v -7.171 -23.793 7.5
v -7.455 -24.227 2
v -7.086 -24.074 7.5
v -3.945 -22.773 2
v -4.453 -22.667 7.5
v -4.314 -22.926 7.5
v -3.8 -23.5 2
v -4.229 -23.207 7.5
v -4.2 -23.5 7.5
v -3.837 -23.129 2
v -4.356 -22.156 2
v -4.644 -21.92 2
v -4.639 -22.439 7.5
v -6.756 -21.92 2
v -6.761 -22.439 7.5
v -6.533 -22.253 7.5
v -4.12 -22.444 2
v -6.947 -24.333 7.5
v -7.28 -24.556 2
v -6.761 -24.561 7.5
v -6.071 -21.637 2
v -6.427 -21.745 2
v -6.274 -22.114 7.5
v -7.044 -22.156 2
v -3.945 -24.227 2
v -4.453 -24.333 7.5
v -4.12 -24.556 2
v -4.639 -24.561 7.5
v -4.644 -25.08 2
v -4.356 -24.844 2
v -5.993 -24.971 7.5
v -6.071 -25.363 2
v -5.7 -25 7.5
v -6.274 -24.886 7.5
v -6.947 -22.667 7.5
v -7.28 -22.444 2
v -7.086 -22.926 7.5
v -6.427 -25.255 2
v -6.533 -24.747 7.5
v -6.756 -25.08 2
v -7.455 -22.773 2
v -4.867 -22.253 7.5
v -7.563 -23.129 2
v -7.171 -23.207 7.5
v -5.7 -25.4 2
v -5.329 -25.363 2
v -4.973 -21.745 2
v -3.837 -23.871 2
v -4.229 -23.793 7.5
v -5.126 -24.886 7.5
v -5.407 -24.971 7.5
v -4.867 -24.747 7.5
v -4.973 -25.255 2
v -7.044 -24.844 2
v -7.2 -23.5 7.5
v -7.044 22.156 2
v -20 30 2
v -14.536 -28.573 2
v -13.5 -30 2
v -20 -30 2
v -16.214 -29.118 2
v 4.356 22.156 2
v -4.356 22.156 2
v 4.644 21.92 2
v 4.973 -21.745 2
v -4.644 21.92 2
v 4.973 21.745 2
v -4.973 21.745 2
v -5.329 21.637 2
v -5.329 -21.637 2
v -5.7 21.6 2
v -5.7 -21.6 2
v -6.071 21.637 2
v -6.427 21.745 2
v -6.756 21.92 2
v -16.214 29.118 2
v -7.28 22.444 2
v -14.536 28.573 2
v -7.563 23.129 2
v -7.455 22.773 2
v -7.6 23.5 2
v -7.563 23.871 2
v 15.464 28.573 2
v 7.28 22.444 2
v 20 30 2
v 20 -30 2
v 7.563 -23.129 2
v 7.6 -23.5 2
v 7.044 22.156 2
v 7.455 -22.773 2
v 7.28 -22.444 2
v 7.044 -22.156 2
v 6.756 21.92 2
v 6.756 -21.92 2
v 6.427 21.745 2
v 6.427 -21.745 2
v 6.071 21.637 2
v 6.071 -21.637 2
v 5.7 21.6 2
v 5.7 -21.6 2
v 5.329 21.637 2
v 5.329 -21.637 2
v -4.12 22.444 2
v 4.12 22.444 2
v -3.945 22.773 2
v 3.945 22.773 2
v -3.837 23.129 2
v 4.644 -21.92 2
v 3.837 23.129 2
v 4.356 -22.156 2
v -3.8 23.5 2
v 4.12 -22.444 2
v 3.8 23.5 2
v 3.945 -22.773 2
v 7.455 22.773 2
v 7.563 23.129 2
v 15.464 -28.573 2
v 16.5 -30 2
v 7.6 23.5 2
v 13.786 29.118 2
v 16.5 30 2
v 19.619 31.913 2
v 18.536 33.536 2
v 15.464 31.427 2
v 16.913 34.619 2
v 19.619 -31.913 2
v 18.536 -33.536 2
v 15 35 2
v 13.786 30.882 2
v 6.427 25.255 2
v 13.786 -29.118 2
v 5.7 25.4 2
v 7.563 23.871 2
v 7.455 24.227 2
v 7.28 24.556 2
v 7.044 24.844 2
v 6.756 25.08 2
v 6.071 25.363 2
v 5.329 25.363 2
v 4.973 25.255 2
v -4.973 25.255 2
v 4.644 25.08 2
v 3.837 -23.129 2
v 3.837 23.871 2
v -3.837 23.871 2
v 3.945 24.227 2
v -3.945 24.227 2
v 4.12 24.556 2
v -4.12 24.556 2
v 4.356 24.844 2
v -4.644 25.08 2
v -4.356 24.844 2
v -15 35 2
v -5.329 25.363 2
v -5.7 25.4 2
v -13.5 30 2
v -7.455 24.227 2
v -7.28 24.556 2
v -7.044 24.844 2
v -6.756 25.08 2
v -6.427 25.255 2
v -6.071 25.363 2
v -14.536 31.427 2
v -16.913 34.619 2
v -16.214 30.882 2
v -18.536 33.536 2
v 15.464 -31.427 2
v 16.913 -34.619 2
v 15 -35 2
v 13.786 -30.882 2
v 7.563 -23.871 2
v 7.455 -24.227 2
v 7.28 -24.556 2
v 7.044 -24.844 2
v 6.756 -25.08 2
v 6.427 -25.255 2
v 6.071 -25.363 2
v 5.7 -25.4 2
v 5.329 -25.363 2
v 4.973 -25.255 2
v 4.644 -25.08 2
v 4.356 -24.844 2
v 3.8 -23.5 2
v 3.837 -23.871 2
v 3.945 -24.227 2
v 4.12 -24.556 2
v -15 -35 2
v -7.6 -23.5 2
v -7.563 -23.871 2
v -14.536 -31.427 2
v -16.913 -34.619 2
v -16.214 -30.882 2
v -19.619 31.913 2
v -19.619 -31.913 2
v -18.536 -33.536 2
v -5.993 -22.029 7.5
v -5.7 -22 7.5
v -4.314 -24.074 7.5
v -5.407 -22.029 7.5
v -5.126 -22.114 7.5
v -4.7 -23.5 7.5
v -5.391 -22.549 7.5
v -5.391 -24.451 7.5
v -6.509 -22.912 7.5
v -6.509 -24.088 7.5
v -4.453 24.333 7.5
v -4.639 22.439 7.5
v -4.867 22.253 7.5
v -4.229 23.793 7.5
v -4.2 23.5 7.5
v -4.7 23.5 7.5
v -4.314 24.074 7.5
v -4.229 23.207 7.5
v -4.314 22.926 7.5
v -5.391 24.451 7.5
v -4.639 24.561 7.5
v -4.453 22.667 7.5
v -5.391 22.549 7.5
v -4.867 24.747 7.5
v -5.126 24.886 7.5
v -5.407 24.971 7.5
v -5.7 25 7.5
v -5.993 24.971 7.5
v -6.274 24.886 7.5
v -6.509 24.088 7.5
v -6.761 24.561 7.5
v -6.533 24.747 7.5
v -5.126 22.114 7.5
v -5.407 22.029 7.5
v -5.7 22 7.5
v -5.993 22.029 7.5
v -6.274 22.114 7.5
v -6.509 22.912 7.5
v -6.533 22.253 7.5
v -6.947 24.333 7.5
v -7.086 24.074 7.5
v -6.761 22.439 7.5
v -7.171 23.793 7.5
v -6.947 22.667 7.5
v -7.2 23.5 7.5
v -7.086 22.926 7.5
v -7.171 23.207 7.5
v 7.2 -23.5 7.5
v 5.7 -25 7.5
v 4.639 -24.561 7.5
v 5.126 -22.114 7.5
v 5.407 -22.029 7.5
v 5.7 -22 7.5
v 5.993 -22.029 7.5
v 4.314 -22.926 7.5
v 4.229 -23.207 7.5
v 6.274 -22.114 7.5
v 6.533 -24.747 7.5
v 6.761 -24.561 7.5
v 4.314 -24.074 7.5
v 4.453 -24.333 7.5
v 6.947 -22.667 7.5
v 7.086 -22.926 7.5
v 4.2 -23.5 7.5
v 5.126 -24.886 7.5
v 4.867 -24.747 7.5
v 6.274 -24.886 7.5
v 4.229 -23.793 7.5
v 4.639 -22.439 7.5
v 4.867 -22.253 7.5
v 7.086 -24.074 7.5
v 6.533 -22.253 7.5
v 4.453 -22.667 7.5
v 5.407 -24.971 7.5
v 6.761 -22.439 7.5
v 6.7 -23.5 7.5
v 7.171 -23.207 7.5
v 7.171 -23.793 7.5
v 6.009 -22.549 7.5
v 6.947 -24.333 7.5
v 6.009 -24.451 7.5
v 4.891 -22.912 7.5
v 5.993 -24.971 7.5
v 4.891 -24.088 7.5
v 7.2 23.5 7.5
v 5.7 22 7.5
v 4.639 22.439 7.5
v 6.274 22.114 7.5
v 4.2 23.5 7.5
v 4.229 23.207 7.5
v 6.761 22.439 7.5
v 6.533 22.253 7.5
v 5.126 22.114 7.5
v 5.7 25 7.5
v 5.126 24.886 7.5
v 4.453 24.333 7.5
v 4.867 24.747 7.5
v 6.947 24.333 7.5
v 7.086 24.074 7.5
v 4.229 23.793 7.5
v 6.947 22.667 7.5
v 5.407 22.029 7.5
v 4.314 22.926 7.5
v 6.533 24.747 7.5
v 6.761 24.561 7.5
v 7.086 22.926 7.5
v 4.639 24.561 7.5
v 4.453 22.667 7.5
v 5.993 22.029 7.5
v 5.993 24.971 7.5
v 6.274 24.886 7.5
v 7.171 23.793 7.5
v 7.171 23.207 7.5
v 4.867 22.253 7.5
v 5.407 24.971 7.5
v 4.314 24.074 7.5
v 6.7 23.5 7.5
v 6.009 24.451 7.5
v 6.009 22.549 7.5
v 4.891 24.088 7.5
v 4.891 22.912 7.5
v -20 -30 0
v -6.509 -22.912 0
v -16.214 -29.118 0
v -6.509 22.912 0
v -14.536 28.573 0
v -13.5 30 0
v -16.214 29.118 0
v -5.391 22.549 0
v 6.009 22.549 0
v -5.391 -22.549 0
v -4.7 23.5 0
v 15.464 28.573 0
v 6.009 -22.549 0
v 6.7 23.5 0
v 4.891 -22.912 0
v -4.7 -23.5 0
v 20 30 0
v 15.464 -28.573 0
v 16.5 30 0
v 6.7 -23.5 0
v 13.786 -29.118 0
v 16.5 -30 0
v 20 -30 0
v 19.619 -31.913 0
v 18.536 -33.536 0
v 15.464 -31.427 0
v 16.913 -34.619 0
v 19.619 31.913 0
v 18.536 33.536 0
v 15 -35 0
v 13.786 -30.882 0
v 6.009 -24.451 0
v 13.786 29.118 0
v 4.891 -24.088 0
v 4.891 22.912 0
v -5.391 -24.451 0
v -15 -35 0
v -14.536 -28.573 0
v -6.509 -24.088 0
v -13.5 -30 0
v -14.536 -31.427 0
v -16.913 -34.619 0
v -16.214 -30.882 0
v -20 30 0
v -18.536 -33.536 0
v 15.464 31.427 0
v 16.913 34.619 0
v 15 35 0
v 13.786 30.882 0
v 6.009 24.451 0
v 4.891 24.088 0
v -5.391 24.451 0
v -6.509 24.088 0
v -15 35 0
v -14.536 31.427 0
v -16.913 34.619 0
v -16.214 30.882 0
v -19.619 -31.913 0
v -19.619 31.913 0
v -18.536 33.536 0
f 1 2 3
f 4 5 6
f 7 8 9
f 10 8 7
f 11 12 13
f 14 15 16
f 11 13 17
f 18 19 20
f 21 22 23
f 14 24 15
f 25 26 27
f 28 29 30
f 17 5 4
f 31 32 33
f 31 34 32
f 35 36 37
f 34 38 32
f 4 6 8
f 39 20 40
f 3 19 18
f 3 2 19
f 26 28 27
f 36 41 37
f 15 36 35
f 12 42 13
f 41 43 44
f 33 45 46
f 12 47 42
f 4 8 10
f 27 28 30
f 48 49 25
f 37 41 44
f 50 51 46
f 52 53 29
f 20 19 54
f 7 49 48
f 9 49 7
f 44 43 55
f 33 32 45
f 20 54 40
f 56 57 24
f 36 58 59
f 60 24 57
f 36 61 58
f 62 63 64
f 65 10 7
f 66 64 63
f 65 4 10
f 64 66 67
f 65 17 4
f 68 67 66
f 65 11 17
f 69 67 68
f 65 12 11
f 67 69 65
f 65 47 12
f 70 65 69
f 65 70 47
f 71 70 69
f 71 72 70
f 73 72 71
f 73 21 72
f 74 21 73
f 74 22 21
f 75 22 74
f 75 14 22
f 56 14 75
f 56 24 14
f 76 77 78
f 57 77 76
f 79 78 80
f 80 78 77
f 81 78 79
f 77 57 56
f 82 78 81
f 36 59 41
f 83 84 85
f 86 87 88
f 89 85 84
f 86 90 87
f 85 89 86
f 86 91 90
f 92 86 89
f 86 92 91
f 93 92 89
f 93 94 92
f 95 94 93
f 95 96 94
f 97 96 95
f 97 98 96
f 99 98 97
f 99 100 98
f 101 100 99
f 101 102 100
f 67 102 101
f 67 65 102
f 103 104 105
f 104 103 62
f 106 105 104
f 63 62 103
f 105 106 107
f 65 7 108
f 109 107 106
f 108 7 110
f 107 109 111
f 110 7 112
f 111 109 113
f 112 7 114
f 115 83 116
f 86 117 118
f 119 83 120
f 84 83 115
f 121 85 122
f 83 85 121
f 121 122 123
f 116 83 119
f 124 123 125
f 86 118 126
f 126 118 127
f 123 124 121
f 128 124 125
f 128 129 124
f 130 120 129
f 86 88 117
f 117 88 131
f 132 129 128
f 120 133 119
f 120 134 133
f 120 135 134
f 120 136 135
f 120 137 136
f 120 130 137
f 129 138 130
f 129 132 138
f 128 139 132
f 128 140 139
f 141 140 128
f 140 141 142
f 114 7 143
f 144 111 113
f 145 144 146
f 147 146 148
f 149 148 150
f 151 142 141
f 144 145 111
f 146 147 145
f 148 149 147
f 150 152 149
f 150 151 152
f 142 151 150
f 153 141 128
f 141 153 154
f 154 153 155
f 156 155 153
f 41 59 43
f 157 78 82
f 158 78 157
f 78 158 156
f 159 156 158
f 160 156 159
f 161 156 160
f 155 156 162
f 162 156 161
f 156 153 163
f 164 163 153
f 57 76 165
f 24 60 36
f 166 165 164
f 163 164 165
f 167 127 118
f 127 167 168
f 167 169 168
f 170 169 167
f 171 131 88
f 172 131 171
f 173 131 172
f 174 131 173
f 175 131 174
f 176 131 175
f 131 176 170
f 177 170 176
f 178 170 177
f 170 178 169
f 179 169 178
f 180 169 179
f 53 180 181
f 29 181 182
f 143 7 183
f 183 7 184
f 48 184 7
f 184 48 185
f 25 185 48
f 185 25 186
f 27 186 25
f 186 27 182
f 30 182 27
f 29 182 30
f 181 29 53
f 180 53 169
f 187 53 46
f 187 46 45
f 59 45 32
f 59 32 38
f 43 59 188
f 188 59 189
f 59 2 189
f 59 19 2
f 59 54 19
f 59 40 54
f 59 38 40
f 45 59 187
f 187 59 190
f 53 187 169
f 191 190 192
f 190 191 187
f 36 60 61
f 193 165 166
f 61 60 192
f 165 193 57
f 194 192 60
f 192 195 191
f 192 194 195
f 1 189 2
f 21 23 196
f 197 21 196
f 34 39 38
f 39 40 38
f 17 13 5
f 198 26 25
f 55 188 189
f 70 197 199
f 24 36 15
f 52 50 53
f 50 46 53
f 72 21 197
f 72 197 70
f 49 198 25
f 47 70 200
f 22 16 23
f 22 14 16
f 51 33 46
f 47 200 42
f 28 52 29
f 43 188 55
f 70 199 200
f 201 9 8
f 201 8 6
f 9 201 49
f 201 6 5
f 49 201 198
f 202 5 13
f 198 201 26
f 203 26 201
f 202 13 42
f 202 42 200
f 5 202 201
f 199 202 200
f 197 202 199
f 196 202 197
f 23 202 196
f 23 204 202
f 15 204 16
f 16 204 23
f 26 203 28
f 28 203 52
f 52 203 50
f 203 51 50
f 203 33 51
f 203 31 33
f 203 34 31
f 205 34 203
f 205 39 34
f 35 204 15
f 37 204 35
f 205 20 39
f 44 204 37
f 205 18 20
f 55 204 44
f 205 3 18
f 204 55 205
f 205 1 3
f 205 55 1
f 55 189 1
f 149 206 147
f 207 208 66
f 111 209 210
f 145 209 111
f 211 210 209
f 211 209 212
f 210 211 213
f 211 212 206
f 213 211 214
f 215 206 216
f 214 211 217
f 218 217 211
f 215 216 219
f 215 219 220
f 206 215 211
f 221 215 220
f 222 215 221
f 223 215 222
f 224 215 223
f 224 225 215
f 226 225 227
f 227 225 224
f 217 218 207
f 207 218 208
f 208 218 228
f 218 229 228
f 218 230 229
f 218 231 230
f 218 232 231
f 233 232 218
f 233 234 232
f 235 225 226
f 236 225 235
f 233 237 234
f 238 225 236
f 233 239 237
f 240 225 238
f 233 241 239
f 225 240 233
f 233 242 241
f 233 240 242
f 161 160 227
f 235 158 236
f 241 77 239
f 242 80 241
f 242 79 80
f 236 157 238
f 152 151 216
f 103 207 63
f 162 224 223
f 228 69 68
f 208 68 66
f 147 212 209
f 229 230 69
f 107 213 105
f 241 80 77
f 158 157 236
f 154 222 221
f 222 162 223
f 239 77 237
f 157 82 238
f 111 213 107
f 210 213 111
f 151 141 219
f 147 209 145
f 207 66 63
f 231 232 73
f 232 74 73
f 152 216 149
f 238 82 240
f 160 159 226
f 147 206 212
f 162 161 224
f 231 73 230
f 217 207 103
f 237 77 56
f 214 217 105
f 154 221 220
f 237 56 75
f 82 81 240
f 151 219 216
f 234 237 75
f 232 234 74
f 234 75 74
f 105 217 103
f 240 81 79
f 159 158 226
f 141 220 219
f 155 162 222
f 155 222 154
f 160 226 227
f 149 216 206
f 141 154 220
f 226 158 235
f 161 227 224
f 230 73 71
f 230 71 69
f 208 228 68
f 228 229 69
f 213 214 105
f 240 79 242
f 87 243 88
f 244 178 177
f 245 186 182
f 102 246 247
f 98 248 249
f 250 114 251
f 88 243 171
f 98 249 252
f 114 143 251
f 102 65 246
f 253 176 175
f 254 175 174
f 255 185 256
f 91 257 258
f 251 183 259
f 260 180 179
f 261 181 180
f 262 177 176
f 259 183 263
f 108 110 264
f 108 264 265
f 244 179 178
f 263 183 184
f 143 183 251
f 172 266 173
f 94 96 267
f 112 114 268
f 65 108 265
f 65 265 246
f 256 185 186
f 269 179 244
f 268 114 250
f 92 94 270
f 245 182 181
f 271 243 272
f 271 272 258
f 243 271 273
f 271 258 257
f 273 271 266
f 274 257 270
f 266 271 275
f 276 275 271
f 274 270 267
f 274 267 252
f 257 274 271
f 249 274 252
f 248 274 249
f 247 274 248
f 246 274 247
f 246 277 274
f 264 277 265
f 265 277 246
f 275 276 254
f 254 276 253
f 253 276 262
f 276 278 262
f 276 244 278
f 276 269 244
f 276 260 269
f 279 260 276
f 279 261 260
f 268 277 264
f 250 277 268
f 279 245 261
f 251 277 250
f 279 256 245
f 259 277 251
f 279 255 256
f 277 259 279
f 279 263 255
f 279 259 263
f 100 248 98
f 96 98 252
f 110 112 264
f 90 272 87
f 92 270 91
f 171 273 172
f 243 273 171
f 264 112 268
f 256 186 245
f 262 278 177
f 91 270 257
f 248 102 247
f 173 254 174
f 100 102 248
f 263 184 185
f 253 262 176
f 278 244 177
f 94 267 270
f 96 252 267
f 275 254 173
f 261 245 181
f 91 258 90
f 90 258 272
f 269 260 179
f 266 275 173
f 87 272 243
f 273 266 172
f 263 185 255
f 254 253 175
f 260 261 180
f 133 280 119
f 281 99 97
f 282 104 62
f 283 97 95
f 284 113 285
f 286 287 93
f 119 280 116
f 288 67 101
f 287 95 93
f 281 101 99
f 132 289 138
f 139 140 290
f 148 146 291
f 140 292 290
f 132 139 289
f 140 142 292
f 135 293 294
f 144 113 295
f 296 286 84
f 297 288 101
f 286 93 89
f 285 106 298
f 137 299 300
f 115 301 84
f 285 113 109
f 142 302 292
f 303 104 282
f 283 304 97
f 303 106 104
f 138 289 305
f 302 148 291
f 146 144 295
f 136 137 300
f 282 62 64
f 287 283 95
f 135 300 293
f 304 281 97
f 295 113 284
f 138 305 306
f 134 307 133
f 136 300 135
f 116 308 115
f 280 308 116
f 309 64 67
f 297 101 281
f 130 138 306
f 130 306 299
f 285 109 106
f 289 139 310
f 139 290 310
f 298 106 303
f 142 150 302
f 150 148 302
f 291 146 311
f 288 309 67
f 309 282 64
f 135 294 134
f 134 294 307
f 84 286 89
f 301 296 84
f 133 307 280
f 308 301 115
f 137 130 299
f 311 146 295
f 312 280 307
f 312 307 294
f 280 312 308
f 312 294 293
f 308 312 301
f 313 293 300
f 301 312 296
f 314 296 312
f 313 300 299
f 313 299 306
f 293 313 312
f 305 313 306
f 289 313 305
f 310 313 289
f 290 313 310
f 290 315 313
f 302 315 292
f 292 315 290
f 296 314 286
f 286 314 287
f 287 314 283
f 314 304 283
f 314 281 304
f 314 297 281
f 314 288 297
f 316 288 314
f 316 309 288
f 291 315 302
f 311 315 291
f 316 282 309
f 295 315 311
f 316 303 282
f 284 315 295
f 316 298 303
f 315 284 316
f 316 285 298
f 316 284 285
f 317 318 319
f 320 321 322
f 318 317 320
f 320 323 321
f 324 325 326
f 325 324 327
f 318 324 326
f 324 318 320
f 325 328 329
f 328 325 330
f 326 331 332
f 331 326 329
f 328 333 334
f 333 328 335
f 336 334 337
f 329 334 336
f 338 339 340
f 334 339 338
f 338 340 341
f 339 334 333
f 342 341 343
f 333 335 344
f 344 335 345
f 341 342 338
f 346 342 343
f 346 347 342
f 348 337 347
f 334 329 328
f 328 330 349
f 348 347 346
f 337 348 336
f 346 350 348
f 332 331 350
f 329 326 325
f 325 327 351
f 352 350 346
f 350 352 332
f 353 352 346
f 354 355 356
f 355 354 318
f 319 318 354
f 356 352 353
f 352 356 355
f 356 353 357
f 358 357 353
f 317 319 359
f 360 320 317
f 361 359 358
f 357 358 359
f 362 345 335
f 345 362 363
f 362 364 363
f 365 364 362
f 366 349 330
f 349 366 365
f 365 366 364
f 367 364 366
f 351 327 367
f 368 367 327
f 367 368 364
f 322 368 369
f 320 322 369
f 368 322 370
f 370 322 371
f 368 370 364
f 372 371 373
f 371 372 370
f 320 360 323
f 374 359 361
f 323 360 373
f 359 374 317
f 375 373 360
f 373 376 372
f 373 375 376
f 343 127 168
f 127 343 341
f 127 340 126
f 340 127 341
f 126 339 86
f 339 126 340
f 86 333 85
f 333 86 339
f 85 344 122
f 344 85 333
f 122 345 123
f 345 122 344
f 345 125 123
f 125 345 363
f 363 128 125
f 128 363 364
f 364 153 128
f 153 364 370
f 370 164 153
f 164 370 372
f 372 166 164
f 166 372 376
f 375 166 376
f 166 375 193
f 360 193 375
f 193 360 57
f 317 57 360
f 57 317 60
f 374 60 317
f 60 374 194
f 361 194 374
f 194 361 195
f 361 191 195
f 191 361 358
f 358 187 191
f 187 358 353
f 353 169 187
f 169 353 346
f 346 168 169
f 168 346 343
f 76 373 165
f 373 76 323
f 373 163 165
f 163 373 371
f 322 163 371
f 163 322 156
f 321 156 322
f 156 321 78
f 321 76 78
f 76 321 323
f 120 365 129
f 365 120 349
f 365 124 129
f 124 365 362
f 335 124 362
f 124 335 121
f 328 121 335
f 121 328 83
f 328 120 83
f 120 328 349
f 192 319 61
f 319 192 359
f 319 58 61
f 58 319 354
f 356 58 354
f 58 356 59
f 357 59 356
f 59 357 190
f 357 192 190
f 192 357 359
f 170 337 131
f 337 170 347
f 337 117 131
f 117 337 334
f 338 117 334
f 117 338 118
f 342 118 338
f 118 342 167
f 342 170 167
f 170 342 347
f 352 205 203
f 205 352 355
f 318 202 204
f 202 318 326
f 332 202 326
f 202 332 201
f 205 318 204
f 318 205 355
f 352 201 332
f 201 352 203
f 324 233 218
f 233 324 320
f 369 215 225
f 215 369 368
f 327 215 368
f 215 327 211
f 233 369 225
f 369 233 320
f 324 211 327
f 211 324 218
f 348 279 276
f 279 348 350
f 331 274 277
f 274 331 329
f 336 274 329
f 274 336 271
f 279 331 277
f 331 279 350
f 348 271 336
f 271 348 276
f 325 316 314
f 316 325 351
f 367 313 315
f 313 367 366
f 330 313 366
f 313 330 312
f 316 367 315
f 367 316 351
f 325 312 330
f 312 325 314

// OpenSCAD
plate_thickness = 2;
plate_corner_radius = 5;

//// Board
// Pi 3, 4, 5
//plate_size = [80, 110];
//plate_hole_centres = [70, 100];
//board_standoff_height = 3.5;
//board_standoff_diameter_top = 5;
//board_standoff_diameter_base = 8;
//board_mounting_hole_centres = [49, 58];
//board_mounting_hole_offset = [0, -10];
//board_mounting_hole_diameter = 2;
// Pi Pico
plate_size = [40, 70];
plate_hole_centres = [30, 60];
board_standoff_height = 5.5;
board_standoff_diameter_top = 3;
board_standoff_diameter_base = 3.8;
board_mounting_hole_centres = [11.4, 47];
board_mounting_hole_offset = [0, 0];
board_mounting_hole_diameter = 2;

//// Plate mounting hole type
// Clearance
//plate_hole_diam = 3.5;
//plate_hole_edges = 16;
// Tapping
plate_hole_diam = 3;
plate_hole_edges = 5;

module LayoutCentres(centres) {
  d = centres / 2;
  for(x = [-d[0], d[0]]) {
    for(y = [-d[1], d[1]]) {
      translate([x, y]) {
        children();
      }
    }
  }
}

difference() {
  union() {
    linear_extrude(height = plate_thickness) {
      difference() {
        // Plate
        hull() {
          padding = plate_corner_radius * 2;
          LayoutCentres(centres = plate_size - [padding, padding]) {
            circle(r = plate_corner_radius);
          }
        }

        // Plate mounting holes
        padding = 10;
        LayoutCentres(centres = plate_hole_centres) {
          circle(d = plate_hole_diam, $fn = plate_hole_edges);
        }
      }
    }

    // Board standoffs
    translate(board_mounting_hole_offset) {
      translate([0, 0, plate_thickness]) {
        LayoutCentres(centres = board_mounting_hole_centres) {
          cylinder(h = board_standoff_height, d1 = board_standoff_diameter_base, d2 = board_standoff_diameter_top, $fn = 32);
        }
      }
    }
  }

  // Board mounting holes
  translate(board_mounting_hole_offset) {
    LayoutCentres(centres = board_mounting_hole_centres) {
      cylinder(h = plate_thickness + board_standoff_height, d = board_mounting_hole_diameter, $fn = 5);
    }
  }
}
